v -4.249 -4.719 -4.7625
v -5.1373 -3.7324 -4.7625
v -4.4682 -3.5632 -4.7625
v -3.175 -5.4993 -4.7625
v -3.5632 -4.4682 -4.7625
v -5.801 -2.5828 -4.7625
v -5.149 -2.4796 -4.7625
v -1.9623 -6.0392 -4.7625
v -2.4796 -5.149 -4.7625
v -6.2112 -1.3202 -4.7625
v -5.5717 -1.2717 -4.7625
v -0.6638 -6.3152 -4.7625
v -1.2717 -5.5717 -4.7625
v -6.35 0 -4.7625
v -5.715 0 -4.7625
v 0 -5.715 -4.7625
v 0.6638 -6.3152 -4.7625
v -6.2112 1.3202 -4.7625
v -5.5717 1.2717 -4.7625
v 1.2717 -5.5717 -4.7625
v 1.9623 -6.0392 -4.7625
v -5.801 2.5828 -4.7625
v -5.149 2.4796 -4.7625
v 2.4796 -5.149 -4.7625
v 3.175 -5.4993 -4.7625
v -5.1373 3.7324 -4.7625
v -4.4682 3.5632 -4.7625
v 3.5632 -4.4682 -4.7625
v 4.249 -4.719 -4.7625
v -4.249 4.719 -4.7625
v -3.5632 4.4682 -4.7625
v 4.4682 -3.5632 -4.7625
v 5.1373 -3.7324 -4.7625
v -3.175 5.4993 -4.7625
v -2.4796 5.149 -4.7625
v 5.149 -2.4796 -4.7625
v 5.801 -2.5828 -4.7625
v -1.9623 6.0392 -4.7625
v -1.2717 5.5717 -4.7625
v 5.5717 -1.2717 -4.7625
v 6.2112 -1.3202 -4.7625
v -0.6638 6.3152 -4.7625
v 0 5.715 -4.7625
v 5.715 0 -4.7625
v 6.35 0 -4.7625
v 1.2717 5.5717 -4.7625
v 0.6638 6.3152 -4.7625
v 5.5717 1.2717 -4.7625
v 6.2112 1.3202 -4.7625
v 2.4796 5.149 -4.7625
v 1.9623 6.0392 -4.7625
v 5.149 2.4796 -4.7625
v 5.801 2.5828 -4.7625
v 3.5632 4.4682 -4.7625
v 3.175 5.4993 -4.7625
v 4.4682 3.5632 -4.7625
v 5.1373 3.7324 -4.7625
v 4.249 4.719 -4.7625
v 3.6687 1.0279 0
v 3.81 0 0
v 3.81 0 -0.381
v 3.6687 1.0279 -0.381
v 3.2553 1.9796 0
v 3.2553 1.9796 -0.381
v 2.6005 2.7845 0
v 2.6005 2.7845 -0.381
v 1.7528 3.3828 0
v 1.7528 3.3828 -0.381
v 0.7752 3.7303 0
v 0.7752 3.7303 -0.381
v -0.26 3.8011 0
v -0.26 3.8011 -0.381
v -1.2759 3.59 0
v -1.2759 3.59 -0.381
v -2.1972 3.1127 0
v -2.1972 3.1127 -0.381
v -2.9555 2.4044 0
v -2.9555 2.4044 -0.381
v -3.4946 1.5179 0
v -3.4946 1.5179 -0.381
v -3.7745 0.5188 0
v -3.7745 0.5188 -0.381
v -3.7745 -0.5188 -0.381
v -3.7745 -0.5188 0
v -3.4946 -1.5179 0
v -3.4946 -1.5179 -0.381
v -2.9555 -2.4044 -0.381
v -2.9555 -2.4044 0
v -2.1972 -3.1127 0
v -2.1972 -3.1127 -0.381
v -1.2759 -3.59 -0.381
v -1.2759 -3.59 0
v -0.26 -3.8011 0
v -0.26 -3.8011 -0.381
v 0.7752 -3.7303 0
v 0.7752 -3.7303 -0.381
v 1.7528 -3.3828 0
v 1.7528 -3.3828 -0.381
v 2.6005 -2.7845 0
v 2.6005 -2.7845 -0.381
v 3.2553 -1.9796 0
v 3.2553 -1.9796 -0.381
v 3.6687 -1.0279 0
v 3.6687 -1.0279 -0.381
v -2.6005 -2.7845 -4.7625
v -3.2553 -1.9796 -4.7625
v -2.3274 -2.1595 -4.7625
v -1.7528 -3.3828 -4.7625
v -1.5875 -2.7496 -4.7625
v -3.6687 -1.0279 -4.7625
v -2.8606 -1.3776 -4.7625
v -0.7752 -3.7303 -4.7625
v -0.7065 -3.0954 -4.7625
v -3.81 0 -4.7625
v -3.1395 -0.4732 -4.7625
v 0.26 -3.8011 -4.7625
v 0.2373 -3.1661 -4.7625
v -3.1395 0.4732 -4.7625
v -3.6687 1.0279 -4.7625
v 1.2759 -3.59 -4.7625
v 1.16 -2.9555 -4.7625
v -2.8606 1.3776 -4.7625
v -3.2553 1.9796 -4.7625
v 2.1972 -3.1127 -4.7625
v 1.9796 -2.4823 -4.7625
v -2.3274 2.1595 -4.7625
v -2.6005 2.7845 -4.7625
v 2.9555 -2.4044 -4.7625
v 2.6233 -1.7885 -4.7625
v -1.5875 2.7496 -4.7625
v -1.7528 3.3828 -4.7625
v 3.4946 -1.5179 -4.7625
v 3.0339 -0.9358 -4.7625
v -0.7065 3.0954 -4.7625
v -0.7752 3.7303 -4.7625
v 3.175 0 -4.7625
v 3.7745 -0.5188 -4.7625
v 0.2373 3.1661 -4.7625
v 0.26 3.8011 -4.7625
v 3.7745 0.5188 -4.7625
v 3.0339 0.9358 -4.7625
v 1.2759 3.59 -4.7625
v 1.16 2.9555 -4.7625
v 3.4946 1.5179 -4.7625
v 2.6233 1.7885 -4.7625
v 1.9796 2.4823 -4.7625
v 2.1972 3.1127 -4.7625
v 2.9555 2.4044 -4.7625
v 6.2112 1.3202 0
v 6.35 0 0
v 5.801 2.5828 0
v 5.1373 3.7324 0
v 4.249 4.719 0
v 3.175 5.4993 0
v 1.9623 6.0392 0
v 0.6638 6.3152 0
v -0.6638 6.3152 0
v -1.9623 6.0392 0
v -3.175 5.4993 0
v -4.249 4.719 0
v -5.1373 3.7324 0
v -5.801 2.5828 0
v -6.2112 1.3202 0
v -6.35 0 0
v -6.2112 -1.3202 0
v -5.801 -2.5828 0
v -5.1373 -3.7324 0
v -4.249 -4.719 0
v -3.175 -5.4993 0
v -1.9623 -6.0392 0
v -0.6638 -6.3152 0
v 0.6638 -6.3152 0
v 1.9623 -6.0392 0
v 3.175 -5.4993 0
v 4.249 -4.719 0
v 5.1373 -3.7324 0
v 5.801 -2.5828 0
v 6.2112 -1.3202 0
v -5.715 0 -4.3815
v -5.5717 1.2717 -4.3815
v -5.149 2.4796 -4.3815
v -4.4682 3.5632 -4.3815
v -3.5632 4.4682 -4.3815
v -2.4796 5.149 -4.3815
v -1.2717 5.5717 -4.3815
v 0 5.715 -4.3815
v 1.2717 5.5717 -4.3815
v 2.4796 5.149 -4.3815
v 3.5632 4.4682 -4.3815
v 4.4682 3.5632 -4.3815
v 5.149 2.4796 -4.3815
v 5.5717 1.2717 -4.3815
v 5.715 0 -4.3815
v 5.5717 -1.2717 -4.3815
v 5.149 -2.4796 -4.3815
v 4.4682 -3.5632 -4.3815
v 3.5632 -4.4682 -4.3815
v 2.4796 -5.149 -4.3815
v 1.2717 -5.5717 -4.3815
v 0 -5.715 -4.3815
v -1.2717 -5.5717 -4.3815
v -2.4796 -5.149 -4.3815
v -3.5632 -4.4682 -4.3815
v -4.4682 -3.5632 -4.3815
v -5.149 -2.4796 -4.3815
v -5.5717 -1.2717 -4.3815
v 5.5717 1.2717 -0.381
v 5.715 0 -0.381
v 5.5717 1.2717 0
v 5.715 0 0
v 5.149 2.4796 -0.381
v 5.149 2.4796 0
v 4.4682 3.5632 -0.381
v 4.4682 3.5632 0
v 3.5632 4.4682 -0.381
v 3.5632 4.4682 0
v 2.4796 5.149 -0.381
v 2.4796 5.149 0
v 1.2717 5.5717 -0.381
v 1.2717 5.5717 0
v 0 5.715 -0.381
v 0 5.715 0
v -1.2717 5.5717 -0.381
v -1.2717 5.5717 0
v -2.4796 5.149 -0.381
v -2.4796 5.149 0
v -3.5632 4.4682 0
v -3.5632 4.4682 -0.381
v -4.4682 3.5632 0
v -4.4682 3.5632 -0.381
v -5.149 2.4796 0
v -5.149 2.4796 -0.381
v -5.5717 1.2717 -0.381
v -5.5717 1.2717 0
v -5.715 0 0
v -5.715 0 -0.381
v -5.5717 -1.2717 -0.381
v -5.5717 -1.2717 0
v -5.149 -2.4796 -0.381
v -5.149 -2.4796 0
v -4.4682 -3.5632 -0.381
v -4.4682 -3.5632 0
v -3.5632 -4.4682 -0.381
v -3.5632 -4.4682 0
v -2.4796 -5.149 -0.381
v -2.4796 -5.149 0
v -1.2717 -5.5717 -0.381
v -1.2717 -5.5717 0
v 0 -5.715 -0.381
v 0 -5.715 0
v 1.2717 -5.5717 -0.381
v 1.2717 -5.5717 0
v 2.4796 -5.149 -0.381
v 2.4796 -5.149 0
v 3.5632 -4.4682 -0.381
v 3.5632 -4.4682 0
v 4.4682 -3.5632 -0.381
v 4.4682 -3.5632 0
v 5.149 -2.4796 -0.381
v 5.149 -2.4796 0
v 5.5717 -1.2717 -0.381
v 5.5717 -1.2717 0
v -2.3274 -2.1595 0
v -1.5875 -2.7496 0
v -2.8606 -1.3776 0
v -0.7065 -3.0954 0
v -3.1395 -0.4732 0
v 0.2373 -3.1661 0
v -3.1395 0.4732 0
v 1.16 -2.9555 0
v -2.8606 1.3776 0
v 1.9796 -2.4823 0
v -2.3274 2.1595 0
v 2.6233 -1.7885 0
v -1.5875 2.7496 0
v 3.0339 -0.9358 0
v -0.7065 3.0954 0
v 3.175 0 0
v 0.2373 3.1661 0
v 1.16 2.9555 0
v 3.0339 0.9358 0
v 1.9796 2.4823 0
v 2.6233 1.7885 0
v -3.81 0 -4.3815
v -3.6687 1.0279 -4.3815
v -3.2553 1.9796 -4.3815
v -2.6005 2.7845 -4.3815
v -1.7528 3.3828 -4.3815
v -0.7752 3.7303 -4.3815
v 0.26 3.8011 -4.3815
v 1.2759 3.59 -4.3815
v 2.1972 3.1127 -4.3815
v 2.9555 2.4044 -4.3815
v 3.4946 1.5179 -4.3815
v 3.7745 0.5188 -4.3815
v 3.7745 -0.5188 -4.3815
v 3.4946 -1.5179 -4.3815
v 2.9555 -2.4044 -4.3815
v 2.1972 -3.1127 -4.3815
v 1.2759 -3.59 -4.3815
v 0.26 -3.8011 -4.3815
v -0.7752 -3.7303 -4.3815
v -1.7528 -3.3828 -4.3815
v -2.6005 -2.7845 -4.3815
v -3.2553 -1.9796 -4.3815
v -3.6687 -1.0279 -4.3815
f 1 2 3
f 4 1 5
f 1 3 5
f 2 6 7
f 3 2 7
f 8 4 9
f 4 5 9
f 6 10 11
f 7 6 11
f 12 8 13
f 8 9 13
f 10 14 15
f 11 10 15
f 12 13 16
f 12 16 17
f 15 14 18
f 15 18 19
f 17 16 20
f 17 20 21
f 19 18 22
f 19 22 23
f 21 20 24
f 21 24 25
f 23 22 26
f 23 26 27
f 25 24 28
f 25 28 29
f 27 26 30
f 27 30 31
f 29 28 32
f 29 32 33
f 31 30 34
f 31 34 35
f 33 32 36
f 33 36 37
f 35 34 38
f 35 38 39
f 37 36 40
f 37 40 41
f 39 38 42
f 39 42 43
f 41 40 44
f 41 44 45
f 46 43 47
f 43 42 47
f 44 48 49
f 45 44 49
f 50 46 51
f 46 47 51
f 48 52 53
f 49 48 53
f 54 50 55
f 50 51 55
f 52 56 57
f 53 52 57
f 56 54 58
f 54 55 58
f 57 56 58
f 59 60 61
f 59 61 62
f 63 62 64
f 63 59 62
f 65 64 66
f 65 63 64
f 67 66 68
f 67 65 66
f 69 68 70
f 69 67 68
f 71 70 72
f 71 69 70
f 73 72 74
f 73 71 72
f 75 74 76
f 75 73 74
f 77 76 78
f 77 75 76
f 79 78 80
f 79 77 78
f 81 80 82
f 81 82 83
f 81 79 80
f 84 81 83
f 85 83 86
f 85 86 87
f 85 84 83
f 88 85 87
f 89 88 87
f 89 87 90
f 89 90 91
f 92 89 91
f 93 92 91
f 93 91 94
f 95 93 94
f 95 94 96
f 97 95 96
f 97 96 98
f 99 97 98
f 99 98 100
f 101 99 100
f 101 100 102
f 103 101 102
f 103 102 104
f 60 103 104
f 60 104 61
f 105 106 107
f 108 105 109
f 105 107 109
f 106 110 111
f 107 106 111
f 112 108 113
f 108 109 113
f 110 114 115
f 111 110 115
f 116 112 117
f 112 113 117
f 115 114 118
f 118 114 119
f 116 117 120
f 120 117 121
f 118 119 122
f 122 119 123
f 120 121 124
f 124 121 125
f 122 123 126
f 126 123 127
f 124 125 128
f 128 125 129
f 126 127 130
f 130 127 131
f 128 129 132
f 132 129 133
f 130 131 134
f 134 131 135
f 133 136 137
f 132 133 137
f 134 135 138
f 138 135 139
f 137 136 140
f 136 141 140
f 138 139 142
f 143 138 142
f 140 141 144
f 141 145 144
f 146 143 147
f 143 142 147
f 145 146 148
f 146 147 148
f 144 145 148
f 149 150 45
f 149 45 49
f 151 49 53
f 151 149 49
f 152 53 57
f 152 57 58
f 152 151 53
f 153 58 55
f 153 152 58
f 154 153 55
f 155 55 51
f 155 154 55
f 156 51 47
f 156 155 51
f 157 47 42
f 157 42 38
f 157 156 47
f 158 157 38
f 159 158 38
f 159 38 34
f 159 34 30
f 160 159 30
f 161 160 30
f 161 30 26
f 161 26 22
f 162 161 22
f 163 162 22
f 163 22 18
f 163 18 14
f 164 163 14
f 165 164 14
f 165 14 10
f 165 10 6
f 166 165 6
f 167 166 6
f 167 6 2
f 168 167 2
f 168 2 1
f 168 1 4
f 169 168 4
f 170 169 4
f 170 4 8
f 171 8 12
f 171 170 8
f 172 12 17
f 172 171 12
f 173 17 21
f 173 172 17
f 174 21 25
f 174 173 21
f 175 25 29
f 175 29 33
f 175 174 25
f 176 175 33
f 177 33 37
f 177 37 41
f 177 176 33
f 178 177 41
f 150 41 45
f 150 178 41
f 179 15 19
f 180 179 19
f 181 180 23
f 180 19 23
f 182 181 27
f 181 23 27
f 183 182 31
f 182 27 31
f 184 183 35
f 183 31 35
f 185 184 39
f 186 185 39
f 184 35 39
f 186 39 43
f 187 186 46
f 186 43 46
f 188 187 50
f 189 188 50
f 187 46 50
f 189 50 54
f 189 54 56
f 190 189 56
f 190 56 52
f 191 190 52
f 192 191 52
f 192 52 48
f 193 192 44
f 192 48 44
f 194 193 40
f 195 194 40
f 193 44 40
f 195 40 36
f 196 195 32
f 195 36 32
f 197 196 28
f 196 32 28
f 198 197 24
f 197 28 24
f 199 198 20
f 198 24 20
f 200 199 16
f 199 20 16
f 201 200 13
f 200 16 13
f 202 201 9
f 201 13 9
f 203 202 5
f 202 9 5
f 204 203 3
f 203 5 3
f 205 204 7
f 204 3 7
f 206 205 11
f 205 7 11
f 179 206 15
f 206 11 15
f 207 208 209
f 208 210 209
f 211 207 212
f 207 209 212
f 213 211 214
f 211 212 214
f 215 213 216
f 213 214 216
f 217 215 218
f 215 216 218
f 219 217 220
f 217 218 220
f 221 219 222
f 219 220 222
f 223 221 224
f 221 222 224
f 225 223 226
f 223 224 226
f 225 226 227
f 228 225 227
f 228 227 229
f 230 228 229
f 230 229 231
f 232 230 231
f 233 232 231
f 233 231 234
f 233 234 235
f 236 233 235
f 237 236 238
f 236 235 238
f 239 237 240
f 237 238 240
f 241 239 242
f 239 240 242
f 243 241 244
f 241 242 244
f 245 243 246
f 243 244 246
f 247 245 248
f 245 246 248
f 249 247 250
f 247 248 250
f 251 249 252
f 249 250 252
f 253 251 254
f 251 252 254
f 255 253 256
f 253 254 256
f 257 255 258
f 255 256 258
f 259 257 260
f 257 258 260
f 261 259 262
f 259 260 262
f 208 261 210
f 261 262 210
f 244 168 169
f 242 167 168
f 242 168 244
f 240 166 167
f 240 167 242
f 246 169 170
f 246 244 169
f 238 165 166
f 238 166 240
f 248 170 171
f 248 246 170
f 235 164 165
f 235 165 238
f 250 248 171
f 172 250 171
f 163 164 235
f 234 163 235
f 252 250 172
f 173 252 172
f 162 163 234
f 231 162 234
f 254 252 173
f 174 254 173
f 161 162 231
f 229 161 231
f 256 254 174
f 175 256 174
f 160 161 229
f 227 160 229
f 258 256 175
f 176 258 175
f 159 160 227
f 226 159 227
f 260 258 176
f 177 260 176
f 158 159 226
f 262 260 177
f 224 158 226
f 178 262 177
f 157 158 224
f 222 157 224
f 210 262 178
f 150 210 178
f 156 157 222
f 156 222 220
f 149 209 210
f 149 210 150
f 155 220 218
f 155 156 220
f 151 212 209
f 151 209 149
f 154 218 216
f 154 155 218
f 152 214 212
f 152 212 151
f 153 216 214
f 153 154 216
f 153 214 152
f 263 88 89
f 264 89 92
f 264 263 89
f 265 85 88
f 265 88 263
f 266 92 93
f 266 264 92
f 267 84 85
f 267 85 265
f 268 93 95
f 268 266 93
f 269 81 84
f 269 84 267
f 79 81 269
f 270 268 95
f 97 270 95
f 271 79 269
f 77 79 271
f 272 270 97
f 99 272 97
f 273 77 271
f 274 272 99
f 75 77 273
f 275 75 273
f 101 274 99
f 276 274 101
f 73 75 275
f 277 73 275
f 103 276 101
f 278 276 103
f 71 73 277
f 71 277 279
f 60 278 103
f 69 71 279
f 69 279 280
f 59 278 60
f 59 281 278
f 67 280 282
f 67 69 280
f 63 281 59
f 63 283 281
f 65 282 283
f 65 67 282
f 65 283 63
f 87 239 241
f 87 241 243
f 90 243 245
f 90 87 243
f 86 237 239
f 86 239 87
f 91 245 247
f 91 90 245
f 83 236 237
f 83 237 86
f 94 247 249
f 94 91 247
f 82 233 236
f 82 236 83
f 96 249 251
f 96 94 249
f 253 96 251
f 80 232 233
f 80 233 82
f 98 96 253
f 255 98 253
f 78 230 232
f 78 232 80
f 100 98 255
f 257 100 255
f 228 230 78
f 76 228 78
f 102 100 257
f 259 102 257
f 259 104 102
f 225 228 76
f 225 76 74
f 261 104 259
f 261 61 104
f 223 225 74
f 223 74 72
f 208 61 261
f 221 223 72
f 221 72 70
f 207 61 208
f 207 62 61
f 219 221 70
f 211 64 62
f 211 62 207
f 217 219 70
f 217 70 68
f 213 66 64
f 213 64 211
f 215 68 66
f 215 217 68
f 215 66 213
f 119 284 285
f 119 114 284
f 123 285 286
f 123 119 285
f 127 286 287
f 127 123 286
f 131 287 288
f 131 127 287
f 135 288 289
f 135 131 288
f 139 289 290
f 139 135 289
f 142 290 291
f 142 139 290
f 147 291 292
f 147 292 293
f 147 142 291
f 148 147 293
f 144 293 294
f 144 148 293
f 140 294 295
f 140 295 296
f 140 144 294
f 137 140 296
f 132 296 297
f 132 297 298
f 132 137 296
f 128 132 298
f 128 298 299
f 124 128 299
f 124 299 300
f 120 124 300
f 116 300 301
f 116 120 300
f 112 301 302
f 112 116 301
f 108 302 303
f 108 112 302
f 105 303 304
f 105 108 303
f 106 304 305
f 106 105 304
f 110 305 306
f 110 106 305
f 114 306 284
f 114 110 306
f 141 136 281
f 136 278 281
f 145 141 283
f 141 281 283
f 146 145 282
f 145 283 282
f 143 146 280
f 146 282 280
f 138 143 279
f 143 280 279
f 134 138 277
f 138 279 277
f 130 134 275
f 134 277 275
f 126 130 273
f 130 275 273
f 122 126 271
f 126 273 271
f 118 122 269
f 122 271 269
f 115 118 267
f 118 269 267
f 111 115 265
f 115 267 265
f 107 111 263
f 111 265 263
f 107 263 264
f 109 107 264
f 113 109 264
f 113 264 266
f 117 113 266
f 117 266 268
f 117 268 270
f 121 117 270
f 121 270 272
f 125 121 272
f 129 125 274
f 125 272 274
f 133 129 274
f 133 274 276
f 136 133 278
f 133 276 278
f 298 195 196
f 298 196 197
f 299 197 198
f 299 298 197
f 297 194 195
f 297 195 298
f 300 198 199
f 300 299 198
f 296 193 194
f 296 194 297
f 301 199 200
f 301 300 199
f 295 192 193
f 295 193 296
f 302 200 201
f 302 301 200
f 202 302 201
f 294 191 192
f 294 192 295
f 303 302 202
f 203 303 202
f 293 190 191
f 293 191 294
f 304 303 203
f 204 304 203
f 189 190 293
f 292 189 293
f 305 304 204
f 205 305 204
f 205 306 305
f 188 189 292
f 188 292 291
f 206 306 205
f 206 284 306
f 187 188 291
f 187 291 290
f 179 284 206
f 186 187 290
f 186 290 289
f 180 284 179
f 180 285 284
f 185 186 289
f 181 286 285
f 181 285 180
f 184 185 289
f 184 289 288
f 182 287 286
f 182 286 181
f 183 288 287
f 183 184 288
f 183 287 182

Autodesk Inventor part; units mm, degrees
ref_plane "YZ Plane" through (0, 0, 0) normal (1, 0, 0) x (0, 1, 0)
ref_plane "XZ Plane" through (0, 0, 0) normal (0, 1, 0) x (-1, 0, 0)
ref_plane "XY Plane" through (0, 0, 0) normal (0, 0, 1) x (1, 0, 0)
sketch "Sketch1" plane through (0, 0, 0) normal (0, 0, 1) x (1, 0, 0)
  circle A0 centre (0, 0) radius 3.175
  circle A1 centre (0, 0) radius 6.35
  dimension "d0" = 6.35
  dimension "d1" = 12.7
extrude "Extrusion1" add sketch "Sketch1" against normal blind 4.7625
sketch "Sketch2" plane through (0, 0, 0) normal (0, 0, 1) x (1, 0, 0)
  circle A0 centre (0, 0) radius 6.35 projected
  circle A1 centre (0, 0) radius 3.175 projected
  circle A2 centre (0, 0) radius 5.715
  circle A3 centre (0, 0) radius 3.81
  dimension "d4" = 0.635
  dimension "d5" = 0.635
extrude "Extrusion2" cut sketch "Sketch2" against normal blind 0.381 contours A2
sketch "Sketch3" plane through (0, 0, -4.7625) normal (0, 0, -1) x (-1, 0, 0)
  circle A0 centre (0, 0) radius 5.715 projected
  circle A1 centre (0, 0) radius 3.81 projected
extrude "Extrusion3" cut sketch "Sketch3" against normal blind 0.381
properties part number "0.25in ID 0.5in OD 0.1875in Deep Roller Bearing"
